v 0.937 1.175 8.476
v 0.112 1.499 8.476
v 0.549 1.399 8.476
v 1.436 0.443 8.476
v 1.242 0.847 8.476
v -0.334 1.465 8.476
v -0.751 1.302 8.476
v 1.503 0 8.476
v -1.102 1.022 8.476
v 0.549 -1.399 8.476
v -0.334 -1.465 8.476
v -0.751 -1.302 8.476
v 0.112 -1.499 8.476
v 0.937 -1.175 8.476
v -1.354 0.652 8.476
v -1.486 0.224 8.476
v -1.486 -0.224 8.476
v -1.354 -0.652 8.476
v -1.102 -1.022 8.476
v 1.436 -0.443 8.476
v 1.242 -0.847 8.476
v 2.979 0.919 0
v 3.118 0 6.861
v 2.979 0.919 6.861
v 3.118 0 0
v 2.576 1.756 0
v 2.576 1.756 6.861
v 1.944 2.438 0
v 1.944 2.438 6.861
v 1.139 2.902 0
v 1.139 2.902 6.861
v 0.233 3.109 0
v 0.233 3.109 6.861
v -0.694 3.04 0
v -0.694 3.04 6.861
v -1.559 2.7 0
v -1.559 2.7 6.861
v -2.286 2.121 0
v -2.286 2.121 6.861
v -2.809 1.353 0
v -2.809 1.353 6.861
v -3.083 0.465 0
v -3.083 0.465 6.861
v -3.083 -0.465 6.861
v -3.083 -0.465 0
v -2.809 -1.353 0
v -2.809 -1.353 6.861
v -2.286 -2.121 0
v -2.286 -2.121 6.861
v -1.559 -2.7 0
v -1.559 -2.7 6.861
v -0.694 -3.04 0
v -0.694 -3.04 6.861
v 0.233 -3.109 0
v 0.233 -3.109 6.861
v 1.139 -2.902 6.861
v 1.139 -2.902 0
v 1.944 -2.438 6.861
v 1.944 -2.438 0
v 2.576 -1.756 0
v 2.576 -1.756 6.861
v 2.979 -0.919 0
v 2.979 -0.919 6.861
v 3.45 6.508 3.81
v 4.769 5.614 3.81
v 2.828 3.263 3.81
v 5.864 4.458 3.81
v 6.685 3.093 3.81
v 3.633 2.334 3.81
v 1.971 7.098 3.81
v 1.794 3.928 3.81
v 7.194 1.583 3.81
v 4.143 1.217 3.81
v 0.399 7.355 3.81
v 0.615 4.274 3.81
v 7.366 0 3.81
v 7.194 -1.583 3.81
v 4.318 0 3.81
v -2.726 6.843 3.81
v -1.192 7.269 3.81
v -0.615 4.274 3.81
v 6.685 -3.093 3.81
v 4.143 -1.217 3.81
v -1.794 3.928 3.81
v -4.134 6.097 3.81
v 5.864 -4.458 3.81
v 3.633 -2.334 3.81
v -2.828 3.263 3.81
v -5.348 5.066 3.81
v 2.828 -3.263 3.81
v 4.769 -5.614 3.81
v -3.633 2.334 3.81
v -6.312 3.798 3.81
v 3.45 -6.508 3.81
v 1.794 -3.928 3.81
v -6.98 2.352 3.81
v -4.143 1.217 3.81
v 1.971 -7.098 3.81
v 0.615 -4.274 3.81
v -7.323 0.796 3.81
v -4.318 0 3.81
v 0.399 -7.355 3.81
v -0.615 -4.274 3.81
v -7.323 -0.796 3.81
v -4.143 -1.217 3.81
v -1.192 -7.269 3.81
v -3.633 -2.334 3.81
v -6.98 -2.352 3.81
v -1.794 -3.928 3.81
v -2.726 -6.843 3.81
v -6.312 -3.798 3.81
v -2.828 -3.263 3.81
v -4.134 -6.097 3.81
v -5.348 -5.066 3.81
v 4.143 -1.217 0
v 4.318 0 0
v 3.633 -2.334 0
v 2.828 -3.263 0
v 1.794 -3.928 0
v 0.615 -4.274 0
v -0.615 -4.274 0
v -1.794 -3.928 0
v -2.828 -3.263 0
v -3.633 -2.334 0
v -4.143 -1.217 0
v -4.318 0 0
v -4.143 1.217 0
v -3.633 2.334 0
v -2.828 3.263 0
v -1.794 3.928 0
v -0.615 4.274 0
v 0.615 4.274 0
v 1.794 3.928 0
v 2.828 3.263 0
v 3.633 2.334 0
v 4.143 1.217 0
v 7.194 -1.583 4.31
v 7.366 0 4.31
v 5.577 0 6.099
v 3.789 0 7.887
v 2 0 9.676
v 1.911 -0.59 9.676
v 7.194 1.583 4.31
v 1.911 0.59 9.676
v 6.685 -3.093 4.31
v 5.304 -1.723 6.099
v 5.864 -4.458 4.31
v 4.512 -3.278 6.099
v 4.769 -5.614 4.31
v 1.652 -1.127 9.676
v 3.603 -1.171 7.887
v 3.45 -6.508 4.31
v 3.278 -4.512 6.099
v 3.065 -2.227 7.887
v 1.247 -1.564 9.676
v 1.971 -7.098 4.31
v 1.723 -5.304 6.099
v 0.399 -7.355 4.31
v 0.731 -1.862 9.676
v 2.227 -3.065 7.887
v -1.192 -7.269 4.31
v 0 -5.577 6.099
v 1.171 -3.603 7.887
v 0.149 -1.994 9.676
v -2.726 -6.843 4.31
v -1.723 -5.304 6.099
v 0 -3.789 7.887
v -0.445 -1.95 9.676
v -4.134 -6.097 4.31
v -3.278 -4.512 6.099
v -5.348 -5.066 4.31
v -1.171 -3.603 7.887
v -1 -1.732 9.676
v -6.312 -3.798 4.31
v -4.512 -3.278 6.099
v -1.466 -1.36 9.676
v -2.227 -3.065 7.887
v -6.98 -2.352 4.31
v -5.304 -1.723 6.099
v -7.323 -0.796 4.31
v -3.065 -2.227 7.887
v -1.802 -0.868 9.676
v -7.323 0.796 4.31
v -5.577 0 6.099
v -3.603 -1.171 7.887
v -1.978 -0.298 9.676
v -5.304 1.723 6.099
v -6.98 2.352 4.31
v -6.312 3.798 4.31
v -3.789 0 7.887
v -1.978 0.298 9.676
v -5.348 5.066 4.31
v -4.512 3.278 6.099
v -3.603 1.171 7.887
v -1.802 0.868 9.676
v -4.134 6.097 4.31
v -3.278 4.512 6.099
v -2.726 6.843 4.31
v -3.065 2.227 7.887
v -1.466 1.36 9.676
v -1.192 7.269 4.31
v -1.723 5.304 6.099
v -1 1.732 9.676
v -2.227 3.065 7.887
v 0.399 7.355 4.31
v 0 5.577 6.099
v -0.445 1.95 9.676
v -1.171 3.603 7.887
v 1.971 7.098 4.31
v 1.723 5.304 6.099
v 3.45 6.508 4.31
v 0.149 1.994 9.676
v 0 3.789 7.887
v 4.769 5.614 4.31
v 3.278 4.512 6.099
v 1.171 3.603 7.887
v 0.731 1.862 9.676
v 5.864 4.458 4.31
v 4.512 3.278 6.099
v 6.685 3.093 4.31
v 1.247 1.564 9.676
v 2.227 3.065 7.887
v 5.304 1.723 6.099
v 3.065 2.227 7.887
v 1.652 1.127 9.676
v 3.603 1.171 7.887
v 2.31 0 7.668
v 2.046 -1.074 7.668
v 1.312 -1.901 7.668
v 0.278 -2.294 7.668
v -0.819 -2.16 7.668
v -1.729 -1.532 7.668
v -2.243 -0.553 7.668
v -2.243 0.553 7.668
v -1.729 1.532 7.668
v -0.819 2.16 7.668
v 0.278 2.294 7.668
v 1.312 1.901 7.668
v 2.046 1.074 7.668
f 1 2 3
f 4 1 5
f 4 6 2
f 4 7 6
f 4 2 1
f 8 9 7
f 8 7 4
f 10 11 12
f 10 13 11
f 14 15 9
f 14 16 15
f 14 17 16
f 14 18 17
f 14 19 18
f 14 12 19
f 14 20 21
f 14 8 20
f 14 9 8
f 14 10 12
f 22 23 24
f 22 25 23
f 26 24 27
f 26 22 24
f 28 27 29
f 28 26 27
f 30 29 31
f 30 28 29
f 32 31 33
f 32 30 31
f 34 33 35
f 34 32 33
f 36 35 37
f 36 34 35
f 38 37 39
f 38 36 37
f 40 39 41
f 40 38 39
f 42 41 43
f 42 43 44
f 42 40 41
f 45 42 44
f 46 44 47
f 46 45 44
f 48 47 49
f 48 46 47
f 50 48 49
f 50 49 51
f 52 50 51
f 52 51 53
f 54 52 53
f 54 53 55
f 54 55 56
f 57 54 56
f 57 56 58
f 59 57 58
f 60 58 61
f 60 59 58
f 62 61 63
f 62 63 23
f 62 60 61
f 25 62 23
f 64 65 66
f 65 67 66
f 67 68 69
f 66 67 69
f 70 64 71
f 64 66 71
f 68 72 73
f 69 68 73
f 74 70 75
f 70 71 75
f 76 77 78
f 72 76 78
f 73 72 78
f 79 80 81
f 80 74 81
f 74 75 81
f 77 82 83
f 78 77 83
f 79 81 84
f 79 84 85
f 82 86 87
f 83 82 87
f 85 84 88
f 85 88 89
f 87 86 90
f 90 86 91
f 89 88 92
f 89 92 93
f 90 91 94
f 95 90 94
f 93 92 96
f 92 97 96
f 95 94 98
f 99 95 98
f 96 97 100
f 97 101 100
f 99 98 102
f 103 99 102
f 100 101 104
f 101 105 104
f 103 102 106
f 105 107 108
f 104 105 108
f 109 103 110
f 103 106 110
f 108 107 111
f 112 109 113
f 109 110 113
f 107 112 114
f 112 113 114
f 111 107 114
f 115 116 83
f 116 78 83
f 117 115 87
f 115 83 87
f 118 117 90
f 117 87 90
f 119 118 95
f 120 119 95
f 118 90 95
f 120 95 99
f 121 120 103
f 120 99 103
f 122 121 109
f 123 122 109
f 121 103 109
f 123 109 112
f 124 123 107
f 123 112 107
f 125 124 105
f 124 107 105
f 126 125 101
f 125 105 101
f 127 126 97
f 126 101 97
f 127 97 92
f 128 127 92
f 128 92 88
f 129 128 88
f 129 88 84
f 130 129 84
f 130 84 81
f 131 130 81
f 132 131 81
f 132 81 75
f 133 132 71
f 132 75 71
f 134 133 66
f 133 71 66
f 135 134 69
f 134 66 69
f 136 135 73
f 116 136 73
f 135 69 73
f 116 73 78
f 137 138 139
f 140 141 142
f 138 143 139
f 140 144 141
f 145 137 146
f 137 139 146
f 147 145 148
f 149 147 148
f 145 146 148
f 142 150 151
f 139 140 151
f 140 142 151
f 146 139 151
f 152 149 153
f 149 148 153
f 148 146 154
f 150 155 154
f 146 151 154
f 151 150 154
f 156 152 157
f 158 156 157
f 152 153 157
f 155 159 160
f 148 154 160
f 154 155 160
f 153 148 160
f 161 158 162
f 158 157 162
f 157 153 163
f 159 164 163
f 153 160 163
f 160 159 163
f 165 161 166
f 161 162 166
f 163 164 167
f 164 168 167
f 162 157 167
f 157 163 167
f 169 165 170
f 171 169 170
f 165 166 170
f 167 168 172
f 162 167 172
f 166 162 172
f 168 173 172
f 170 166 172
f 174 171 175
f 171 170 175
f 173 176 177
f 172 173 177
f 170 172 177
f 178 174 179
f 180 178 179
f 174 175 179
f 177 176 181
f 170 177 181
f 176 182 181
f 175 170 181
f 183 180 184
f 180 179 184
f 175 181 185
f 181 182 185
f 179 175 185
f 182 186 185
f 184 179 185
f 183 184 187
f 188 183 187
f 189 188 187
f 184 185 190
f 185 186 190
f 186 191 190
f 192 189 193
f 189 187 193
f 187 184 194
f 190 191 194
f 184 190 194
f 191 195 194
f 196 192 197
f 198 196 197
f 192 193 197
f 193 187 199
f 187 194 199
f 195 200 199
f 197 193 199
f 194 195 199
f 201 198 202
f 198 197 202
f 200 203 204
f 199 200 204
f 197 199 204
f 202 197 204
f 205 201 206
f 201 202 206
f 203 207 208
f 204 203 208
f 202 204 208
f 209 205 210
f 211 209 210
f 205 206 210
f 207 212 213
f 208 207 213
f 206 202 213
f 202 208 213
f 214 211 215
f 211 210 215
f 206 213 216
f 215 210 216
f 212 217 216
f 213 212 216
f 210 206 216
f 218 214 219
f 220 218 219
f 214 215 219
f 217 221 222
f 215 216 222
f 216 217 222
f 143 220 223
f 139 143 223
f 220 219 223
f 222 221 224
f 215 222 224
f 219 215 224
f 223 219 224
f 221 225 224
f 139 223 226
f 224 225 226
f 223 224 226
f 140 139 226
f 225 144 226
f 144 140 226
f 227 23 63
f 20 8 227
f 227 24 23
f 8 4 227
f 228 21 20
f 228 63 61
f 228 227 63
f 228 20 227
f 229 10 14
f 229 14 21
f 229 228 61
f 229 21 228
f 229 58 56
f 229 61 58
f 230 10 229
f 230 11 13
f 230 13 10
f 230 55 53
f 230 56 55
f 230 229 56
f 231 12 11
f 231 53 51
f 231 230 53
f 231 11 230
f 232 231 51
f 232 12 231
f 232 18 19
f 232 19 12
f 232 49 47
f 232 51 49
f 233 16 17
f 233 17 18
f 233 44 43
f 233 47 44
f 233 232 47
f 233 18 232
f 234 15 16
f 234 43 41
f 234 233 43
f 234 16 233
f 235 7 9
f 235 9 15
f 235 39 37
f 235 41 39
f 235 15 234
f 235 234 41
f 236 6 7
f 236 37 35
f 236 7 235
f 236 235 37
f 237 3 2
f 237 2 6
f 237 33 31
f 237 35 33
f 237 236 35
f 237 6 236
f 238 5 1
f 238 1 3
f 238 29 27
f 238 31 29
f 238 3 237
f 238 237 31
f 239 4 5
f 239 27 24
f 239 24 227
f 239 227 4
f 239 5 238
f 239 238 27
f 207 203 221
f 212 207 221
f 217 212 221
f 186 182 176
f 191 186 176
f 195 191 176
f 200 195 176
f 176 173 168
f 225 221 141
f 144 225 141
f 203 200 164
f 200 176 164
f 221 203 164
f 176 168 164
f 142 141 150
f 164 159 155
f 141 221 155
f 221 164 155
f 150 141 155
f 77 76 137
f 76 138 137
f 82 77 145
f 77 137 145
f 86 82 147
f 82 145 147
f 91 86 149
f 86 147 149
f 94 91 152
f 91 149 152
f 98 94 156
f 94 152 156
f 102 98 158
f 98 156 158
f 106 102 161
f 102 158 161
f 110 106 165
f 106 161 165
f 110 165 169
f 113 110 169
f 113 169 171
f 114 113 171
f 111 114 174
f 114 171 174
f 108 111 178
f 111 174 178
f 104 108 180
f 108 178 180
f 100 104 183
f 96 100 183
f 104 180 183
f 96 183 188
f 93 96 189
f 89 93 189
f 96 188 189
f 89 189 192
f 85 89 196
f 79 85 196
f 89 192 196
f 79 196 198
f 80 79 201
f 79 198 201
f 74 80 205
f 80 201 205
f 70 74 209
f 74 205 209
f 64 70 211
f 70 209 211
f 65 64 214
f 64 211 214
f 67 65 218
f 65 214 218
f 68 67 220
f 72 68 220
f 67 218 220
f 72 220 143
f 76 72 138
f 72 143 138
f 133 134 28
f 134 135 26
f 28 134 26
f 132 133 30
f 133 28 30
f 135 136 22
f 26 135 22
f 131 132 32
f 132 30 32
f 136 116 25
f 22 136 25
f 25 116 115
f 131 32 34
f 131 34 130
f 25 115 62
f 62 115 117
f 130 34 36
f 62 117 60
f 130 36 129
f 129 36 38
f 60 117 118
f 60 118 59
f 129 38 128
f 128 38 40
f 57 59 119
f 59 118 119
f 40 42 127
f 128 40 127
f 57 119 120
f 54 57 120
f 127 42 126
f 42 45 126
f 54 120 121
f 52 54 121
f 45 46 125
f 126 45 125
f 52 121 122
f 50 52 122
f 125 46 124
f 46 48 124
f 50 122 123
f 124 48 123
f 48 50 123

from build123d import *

# Parameters (mm, degrees)
F2_T = -1.2


with BuildPart() as f1:
    # F0 (on Front) → F1 (revolve)
    with BuildSketch(Plane.XZ):
        Polygon((0, 9.676), (0, 0), (4.318, 0), (4.318, 3.81), (7.366, 3.81), (7.366, 4.31), (2, 9.676), align=None)
    revolve(axis=Axis((0, 0, 4.838), (0, 0, -1)))

    # F2
    f2_openings = [f1.faces().sort_by_distance(p)[0] for p in [
        (0, 0, 0),
    ]]
    offset(amount=F2_T, openings=f2_openings, kind=Kind.INTERSECTION)

    # F3 (on Front) → F4 (revolve)
    with BuildSketch(Plane.XZ):
        Polygon((4.9689437252, 5.01), (3.118, 6.8609437252), (3.118, 5.01), align=None)
    revolve(axis=Axis((0, 0, 0), (0, 0, 1)))


solid = f1.part
